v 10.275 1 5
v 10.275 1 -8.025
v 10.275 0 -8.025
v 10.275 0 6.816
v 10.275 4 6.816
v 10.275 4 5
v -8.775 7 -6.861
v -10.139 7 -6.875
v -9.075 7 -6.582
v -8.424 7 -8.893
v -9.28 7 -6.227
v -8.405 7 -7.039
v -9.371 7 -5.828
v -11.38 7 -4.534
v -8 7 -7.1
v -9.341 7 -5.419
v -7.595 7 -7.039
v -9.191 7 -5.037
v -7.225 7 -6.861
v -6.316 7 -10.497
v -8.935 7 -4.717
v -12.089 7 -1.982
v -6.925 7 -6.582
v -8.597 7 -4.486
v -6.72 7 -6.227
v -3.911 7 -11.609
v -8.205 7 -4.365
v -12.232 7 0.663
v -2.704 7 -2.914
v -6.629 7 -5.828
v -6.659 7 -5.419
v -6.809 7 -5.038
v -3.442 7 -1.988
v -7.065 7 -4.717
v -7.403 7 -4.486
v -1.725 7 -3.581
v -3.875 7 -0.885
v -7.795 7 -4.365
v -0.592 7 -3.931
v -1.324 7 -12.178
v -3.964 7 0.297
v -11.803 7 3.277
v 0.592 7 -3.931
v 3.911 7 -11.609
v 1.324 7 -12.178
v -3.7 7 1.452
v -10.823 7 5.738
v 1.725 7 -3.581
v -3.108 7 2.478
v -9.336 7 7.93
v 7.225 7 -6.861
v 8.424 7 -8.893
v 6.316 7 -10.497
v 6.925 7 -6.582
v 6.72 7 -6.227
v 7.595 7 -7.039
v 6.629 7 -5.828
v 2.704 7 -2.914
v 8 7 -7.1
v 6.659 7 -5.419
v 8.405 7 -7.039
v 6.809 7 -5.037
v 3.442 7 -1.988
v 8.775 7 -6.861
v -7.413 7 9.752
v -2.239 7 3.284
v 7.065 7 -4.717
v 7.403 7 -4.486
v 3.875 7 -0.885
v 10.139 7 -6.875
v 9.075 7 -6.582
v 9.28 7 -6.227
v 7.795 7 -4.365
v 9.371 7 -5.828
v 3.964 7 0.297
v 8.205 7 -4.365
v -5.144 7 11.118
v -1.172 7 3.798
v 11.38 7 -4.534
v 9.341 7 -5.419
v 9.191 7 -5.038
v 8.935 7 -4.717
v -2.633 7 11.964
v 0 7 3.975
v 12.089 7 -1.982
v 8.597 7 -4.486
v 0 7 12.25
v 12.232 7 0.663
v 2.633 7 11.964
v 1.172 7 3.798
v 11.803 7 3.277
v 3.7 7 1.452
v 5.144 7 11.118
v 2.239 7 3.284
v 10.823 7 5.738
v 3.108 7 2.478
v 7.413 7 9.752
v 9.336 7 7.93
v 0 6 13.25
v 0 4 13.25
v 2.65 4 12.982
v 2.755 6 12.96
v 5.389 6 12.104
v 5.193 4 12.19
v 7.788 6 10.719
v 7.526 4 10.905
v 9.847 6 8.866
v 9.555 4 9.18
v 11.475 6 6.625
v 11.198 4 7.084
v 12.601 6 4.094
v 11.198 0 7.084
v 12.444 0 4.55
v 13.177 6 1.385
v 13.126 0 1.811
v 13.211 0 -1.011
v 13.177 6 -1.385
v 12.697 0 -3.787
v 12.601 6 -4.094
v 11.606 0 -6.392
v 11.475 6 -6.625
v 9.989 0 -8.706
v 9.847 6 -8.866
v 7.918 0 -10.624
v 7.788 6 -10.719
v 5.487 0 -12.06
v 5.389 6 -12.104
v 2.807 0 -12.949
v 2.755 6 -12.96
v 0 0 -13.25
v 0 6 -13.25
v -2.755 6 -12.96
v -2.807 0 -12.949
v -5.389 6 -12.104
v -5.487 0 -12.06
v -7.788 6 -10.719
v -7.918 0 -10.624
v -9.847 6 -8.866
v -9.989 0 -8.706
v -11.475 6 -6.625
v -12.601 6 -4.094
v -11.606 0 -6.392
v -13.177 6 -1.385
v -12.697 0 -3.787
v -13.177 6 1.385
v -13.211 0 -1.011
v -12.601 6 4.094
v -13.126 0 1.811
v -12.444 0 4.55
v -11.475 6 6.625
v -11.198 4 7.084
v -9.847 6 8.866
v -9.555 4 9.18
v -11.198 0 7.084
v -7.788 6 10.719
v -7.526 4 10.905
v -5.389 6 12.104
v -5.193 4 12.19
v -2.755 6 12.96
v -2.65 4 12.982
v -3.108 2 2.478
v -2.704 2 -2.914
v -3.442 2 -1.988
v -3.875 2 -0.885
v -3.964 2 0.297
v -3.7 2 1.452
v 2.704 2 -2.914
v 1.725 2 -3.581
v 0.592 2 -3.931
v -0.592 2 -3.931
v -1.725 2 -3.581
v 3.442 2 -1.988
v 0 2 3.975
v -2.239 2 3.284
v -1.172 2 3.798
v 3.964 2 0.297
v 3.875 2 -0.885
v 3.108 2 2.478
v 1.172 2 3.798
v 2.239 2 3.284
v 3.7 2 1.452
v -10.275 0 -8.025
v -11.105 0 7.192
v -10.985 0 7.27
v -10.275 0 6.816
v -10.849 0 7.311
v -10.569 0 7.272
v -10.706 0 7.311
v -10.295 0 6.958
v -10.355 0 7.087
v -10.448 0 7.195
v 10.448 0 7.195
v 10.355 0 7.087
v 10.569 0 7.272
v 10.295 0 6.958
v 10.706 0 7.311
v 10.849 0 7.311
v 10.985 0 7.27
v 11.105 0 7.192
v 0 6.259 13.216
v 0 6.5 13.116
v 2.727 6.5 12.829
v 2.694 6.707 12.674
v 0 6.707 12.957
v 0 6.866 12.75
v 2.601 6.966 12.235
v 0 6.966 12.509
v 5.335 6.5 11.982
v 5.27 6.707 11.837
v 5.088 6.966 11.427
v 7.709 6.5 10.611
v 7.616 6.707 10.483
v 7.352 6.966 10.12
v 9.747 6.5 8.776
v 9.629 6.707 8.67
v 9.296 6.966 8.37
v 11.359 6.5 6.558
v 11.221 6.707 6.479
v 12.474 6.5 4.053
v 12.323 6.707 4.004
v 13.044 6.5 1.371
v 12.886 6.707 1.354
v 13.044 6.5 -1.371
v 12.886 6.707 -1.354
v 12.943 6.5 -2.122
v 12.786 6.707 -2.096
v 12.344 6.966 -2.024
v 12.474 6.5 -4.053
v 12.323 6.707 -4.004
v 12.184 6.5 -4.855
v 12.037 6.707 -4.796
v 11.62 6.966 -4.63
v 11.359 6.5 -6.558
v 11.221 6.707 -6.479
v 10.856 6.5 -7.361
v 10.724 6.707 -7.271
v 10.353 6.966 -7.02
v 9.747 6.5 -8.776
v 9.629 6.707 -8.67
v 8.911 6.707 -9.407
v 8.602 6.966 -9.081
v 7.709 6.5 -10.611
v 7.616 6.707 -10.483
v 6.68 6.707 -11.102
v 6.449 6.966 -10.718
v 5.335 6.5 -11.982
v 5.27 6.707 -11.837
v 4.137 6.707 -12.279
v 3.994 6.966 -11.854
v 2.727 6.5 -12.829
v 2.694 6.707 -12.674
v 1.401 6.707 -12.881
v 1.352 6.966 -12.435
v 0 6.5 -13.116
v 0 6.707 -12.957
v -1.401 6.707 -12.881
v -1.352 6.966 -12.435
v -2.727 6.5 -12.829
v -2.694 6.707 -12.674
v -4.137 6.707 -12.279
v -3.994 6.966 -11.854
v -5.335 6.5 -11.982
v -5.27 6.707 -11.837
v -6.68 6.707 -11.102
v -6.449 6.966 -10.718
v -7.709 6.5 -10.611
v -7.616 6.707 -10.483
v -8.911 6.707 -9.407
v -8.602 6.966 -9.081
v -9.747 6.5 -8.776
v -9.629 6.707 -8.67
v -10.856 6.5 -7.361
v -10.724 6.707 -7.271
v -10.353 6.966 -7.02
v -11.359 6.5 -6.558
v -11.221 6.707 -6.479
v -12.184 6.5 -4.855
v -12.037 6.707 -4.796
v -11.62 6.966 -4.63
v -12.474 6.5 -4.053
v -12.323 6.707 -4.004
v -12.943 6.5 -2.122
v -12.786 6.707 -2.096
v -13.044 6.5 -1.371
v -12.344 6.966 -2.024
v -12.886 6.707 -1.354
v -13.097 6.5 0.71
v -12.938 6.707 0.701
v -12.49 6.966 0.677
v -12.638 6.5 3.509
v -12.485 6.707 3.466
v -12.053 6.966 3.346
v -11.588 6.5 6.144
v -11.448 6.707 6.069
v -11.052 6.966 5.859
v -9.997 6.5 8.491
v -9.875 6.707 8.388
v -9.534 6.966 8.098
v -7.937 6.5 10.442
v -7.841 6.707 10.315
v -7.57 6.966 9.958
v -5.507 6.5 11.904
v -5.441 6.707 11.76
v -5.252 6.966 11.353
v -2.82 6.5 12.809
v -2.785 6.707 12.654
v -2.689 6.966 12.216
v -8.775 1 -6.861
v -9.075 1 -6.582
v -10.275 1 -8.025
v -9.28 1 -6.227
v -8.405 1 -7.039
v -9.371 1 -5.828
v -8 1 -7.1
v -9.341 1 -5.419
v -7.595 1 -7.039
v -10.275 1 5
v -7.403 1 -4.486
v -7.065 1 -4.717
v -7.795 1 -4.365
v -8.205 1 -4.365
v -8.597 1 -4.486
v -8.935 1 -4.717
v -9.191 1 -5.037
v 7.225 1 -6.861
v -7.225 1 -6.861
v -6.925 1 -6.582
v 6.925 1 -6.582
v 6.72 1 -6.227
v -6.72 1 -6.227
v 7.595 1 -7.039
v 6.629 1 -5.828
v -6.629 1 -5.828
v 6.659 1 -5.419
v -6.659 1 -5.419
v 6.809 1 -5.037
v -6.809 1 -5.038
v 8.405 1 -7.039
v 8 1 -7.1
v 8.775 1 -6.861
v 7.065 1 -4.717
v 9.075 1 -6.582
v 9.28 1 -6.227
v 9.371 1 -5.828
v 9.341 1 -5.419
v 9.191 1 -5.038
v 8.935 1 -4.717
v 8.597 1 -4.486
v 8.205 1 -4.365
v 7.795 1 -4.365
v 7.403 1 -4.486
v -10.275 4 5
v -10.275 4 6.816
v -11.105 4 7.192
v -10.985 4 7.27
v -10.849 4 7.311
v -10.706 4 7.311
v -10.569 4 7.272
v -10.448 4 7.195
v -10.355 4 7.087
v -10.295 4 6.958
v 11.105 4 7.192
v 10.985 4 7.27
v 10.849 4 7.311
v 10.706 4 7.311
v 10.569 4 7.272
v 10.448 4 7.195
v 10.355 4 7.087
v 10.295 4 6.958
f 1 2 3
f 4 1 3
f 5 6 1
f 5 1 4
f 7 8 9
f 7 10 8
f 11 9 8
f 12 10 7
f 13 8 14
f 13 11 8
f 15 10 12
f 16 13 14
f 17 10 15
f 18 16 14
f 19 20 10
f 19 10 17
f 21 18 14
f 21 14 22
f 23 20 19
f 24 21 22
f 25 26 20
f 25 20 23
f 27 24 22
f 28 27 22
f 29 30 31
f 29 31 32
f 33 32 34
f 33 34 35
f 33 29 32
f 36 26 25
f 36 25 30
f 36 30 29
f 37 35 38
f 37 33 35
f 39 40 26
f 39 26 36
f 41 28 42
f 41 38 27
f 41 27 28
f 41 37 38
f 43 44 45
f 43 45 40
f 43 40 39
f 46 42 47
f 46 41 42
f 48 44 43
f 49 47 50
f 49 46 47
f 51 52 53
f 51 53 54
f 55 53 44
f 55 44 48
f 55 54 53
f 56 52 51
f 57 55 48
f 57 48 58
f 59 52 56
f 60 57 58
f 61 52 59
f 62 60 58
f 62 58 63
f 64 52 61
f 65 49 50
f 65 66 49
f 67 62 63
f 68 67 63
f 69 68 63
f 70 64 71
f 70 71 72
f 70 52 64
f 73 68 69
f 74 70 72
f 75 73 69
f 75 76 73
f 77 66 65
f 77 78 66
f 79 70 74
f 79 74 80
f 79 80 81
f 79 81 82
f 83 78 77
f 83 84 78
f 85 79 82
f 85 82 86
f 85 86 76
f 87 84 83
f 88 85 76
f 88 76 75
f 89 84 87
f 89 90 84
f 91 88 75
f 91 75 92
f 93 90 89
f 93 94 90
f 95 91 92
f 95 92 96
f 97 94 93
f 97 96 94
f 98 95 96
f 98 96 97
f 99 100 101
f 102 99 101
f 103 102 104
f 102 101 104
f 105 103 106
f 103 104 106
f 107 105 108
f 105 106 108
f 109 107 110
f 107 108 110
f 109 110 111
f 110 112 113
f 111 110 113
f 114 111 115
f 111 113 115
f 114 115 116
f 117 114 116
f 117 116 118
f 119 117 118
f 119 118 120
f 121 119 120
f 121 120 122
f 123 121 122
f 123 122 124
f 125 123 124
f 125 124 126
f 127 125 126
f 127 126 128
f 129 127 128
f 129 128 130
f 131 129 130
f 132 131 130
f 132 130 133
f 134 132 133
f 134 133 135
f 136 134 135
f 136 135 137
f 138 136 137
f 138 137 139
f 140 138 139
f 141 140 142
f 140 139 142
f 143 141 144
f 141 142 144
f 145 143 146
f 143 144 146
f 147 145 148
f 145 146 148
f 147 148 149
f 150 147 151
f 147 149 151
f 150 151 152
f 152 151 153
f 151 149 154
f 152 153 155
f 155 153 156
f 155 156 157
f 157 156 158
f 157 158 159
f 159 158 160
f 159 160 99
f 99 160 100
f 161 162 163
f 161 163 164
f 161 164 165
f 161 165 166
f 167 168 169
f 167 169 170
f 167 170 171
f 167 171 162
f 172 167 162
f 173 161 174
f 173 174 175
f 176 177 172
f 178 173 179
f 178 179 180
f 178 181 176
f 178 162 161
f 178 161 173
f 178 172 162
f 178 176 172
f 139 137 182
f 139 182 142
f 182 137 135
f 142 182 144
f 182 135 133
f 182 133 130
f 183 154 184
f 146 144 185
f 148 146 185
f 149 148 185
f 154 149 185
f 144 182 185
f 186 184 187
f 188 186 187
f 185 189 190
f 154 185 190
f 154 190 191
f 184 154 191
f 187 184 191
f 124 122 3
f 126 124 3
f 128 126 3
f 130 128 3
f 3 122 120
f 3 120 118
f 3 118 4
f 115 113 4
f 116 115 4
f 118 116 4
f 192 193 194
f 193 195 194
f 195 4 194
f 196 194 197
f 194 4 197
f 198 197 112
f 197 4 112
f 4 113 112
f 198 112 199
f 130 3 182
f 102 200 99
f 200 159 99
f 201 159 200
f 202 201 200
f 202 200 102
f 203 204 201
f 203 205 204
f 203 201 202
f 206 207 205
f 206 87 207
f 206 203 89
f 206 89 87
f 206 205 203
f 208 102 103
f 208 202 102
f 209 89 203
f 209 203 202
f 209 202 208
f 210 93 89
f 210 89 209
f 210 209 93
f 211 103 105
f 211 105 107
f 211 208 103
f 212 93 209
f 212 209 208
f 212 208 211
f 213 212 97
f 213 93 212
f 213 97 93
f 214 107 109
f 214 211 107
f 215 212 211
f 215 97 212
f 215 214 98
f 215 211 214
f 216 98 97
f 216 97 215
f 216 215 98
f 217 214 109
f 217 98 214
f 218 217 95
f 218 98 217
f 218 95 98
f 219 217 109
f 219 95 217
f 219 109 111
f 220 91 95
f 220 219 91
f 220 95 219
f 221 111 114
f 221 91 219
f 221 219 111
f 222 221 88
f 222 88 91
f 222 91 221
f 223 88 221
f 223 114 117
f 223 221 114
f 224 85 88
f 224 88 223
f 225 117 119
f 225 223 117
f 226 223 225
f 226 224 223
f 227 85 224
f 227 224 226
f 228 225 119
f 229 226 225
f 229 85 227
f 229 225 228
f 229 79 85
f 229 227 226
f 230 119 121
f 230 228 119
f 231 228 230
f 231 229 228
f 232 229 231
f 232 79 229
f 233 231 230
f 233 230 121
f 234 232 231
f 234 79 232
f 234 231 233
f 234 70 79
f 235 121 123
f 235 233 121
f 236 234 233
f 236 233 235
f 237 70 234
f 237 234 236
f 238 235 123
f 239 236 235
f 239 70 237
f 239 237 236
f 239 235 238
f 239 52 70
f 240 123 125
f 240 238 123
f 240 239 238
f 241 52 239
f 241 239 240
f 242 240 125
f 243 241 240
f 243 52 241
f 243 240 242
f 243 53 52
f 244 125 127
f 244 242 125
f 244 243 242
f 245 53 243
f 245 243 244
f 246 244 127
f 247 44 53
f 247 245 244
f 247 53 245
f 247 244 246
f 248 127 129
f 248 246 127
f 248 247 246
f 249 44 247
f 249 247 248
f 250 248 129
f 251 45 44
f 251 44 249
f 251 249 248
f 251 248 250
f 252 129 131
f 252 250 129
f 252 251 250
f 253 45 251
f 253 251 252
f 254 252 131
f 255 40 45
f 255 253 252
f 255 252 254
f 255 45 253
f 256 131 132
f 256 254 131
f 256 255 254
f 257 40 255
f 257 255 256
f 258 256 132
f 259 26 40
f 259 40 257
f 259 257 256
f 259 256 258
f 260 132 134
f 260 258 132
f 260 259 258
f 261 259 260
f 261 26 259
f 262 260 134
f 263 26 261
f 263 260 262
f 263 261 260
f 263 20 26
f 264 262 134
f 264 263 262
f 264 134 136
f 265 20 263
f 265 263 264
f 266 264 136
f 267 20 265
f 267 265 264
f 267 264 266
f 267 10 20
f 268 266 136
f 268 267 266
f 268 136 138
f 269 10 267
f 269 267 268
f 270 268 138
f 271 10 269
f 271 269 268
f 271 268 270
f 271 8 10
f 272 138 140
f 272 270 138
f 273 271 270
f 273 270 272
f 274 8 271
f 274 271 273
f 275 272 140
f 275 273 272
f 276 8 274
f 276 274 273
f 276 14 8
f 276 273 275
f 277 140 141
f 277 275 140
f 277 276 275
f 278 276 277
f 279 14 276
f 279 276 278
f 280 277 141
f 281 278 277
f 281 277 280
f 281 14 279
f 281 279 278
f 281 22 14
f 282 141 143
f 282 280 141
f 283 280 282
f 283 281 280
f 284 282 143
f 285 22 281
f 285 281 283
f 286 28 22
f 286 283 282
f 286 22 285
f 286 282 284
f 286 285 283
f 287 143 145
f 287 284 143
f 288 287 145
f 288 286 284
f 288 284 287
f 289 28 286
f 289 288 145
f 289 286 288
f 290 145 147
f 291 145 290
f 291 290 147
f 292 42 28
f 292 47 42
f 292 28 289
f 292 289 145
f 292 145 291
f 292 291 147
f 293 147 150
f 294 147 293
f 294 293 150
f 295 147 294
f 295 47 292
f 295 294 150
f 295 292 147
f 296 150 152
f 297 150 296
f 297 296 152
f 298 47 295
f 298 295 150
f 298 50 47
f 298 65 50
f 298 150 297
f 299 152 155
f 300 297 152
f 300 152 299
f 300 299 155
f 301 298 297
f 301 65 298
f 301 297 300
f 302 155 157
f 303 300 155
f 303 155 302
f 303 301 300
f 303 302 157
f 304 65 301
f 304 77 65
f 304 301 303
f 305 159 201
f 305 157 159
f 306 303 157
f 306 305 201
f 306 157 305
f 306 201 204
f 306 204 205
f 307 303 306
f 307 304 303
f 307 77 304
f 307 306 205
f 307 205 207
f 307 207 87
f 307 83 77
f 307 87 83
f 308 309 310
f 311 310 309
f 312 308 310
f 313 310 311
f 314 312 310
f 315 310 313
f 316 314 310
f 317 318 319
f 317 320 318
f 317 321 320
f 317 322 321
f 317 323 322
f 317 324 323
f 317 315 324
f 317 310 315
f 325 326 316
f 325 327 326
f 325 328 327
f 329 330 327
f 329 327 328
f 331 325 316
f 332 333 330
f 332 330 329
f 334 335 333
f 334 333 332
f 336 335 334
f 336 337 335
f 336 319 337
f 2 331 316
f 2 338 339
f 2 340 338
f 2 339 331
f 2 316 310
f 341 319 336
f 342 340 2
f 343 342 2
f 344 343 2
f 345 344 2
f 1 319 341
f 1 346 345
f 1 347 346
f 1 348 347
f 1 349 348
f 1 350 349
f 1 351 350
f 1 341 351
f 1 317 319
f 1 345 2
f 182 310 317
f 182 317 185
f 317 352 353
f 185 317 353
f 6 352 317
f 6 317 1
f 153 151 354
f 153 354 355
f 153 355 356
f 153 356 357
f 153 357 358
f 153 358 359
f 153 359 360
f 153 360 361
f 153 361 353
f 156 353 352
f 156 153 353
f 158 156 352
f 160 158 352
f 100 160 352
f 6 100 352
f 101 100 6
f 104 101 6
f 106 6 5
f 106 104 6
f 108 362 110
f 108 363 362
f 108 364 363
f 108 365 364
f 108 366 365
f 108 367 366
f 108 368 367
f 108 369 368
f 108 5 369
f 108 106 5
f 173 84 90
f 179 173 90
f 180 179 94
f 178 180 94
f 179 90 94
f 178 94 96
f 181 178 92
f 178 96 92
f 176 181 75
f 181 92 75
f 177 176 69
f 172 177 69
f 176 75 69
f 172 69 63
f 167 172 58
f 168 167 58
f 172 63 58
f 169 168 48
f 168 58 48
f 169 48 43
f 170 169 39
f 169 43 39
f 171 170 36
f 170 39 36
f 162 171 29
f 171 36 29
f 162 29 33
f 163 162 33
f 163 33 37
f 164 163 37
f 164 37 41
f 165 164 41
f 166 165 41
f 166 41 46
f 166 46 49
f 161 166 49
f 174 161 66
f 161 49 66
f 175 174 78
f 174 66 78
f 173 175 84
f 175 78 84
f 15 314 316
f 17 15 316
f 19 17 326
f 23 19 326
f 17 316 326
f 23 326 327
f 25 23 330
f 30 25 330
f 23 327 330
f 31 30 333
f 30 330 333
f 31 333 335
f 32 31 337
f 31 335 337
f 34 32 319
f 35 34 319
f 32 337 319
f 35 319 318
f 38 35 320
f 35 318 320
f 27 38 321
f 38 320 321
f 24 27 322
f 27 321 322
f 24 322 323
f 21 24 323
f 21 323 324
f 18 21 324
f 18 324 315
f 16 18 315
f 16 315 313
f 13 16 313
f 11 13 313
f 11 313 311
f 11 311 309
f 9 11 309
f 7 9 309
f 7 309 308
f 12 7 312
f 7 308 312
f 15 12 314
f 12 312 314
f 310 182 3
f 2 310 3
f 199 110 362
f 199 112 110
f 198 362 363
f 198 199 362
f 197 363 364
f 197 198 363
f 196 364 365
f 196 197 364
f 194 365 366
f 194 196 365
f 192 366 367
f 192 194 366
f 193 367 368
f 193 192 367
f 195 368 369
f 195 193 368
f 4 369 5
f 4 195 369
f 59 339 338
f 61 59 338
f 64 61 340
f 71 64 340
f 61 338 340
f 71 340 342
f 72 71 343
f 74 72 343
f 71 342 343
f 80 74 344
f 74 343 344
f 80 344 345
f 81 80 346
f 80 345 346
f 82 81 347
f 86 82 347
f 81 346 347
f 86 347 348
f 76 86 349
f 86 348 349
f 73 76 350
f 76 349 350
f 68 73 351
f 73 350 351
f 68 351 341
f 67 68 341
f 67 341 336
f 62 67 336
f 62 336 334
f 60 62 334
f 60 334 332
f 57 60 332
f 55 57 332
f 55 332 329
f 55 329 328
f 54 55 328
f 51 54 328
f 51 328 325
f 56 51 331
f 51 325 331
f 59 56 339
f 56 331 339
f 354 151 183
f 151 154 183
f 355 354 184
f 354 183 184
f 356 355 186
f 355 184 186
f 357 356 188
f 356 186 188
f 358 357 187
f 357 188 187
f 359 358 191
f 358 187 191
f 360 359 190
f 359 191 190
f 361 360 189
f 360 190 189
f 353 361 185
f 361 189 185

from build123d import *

# Parameters (mm, degrees)
SKETCH2_R               = 13.25
BOSS_EXTRUDE1_DEPTH     = 7
SKETCH3_R               = 3.975
CUT_EXTRUDE1_DEPTH      = 5
SKETCH4_W               = 20.55
SKETCH4_H               = 16.05
CUT_EXTRUDE2_DEPTH      = 1
SKETCH5_R               = 1.375
CUT_EXTRUDE3_DEPTH      = 6
FILLET1_R               = 1
CUT_EXTRUDE5_DEPTH      = 1
CUT_EXTRUDE5_DEPTH_BACK = 3
SKETCH6_W               = 20.55
SKETCH6_H               = 8.25
FILLET2_R               = 0.5


with BuildPart() as part:
    # Sketch2 → Boss-Extrude1 (new body)
    with BuildSketch(Plane(origin=(0, 0, 0), x_dir=(1, 0, 0), z_dir=(0, 1, 0))):
        with Locations(Location((0, 0, 0), (0, 0, 270))):
            Circle(SKETCH2_R)
    extrude(amount=BOSS_EXTRUDE1_DEPTH)

    # Sketch3 → Cut-Extrude1 (cut)
    with BuildSketch(Plane(origin=(0, 7, 0), x_dir=(1, 0, 0), z_dir=(0, 1, 0))):
        with Locations(Location((0, 0, 0), (0, 0, 270))):
            Circle(SKETCH3_R)
    extrude(amount=-CUT_EXTRUDE1_DEPTH, mode=Mode.SUBTRACT)

    # Sketch4 → Cut-Extrude2 (cut)
    with BuildSketch(Plane.XZ):
        Rectangle(SKETCH4_W, SKETCH4_H)
    extrude(amount=-CUT_EXTRUDE2_DEPTH, mode=Mode.SUBTRACT)

    # Sketch5 → Cut-Extrude3 (cut)
    with BuildSketch(Plane.XZ.offset(-1)):
        with Locations(Location((-8, -5.725, 0), (0, 0, 270))):
            Circle(SKETCH5_R)
        with Locations(Location((8, -5.725, 0), (0, 0, 270))):
            Circle(SKETCH5_R)
    extrude(amount=-CUT_EXTRUDE3_DEPTH, mode=Mode.SUBTRACT)

    # Fillet1
    fillet1_edges = [part.edges().sort_by_distance(p)[0] for p in [
        (0, 7, -13.25),
    ]]
    fillet(fillet1_edges, radius=FILLET1_R)

    # Sketch6 → Cut-Extrude5 (cut, two sides: drawn at the far end of the back side and taken through both)
    with BuildSketch(Plane.XZ.offset(-1).offset(-CUT_EXTRUDE5_DEPTH_BACK)):
        with Locations((0, 9.125)):
            Rectangle(SKETCH6_W, SKETCH6_H)
    extrude(amount=CUT_EXTRUDE5_DEPTH + CUT_EXTRUDE5_DEPTH_BACK, mode=Mode.SUBTRACT)

    # Fillet2
    fillet2_edges = [part.edges().sort_by_distance(p)[0] for p in [
        (-10.275, 2, 8.36581586),
        (10.275, 2, 8.36581586),
    ]]
    fillet(fillet2_edges, radius=FILLET2_R)


solid = part.part
